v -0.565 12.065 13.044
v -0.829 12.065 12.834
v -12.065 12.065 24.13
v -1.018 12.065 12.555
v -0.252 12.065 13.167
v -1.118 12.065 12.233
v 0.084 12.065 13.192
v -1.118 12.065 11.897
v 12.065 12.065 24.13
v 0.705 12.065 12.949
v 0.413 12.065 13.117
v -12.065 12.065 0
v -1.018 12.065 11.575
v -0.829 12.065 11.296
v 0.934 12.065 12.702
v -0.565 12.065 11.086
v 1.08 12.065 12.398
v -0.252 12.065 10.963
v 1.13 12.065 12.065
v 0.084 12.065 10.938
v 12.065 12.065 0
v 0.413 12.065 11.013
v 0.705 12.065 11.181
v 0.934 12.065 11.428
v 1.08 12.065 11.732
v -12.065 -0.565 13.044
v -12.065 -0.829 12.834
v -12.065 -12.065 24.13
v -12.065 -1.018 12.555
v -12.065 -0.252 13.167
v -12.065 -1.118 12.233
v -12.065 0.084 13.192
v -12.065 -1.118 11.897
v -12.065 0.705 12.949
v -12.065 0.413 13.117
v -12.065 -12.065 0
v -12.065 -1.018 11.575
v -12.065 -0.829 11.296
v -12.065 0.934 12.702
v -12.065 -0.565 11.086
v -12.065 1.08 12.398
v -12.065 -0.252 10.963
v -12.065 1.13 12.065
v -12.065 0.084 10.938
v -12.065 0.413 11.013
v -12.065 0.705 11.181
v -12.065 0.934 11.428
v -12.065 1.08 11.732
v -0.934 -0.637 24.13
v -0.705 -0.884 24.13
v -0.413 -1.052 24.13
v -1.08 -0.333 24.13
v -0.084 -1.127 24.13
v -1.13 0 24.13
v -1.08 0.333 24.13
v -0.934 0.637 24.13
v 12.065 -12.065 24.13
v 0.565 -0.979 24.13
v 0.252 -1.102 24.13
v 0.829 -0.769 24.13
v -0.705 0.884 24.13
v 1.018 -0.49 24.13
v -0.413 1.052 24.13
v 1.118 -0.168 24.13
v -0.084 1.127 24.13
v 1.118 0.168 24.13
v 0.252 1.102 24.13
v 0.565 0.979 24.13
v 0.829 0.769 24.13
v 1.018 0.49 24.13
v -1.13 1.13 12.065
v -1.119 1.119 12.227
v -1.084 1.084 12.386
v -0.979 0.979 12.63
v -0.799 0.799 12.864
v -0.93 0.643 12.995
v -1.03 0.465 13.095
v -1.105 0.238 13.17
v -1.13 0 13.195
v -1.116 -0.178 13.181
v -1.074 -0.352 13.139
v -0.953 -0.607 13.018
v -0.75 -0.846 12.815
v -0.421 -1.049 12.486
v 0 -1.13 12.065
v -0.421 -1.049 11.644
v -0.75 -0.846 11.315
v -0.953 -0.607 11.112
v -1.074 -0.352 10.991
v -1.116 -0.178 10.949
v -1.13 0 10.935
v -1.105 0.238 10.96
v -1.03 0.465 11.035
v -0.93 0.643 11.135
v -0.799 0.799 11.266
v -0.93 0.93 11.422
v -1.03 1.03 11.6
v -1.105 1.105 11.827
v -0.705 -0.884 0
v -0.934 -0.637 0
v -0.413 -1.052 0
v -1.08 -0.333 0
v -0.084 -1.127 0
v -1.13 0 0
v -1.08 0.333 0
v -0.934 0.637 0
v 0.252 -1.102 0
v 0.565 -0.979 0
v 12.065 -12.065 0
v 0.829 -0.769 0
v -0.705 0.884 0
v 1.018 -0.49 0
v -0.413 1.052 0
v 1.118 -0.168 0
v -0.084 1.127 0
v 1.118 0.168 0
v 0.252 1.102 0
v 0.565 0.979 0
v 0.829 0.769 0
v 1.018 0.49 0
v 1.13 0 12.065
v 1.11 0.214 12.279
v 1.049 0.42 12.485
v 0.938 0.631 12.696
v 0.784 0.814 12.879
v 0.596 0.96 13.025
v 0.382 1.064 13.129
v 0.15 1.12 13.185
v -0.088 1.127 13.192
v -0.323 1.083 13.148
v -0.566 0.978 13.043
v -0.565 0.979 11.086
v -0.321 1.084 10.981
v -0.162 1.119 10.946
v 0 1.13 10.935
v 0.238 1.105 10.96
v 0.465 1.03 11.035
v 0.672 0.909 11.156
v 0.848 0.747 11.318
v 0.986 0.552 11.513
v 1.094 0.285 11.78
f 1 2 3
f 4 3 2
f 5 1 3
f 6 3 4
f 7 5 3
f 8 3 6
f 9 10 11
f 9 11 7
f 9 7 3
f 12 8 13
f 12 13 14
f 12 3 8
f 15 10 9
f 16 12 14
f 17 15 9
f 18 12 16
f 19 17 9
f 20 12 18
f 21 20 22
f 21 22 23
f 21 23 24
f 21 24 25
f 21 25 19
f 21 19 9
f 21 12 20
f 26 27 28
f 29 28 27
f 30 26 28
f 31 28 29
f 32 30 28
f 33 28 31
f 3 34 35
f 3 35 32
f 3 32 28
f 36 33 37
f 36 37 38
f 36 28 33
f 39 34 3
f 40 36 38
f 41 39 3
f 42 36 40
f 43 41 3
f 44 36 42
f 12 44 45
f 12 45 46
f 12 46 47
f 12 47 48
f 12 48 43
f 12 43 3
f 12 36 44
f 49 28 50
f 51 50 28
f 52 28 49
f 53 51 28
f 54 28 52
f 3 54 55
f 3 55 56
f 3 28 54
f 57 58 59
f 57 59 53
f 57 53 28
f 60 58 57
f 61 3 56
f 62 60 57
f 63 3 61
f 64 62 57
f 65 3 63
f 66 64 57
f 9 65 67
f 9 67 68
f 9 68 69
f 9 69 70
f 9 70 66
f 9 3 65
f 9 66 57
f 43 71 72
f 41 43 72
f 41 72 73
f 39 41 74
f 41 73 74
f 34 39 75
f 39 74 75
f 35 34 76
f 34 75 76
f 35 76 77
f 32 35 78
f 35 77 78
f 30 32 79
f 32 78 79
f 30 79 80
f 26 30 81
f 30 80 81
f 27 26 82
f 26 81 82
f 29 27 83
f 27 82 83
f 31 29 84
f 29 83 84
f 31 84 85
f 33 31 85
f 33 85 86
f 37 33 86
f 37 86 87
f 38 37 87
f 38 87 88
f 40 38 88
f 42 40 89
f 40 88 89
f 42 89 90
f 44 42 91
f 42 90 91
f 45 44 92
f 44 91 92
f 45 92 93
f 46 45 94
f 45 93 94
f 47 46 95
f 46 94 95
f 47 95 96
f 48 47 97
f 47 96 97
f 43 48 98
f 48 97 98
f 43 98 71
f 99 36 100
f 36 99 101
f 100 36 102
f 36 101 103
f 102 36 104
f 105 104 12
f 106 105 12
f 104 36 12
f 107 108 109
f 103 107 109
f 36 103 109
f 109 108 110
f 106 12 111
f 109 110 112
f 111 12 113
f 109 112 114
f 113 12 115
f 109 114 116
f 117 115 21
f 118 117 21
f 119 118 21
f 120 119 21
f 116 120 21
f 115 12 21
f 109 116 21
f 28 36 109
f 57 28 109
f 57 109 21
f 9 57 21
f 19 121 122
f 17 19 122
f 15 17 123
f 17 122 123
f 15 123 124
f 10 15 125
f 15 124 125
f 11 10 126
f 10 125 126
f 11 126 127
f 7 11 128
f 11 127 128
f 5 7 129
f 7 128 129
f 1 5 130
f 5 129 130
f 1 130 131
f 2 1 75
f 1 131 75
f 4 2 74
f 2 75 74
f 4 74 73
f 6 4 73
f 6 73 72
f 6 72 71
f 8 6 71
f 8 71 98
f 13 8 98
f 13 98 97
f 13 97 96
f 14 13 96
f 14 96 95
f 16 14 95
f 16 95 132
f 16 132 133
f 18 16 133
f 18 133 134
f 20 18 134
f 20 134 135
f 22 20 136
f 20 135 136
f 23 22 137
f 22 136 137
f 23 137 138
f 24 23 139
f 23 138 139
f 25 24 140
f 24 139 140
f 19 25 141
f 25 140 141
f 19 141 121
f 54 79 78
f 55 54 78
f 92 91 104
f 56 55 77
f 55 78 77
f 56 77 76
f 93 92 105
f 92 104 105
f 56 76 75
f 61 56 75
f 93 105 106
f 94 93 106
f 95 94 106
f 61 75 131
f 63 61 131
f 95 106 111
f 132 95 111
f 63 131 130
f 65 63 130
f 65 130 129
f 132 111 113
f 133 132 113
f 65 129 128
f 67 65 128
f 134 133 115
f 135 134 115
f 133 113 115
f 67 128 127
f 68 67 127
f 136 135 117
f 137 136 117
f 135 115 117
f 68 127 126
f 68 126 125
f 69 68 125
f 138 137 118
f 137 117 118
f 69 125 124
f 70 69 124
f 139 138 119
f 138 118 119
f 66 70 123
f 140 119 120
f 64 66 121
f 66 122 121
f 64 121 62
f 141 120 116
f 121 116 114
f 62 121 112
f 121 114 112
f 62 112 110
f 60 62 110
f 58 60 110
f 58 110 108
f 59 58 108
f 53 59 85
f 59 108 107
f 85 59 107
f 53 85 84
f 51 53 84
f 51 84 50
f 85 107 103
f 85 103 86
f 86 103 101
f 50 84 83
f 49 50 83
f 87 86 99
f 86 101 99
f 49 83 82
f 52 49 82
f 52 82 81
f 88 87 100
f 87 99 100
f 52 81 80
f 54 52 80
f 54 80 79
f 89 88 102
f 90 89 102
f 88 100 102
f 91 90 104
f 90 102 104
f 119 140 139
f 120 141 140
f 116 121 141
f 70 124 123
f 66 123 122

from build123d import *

# Parameters (mm, degrees)
F0_W     = 24.13
F0_H     = 24.13
F1_DEPTH = 24.13
F3_D     = 2.2606
F5_D     = 2.2606
F5_DEPTH = 12.066
F7_D     = 2.2606
F7_DEPTH = 12.066


with BuildPart() as f1:
    # F0 (on Top) → F1 (new body)
    with BuildSketch(Plane.XY):
        Rectangle(F0_W, F0_H)
    extrude(amount=F1_DEPTH)

    # F3 (through all)
    with Locations(Plane.XY.offset(24.13)):
        with Locations((0, 0)):
            Hole(F3_D / 2)

    # F5 (through all, one way)
    with BuildSketch(Plane.XZ):
        with Locations((0, 12.065)):
            Circle(F5_D / 2)
    extrude(amount=-F5_DEPTH, mode=Mode.SUBTRACT)

    # F7 (through all, one way)
    with BuildSketch(Plane.YZ):
        with Locations((0, 12.065)):
            Circle(F7_D / 2)
    extrude(amount=-F7_DEPTH, mode=Mode.SUBTRACT)


solid = f1.part
